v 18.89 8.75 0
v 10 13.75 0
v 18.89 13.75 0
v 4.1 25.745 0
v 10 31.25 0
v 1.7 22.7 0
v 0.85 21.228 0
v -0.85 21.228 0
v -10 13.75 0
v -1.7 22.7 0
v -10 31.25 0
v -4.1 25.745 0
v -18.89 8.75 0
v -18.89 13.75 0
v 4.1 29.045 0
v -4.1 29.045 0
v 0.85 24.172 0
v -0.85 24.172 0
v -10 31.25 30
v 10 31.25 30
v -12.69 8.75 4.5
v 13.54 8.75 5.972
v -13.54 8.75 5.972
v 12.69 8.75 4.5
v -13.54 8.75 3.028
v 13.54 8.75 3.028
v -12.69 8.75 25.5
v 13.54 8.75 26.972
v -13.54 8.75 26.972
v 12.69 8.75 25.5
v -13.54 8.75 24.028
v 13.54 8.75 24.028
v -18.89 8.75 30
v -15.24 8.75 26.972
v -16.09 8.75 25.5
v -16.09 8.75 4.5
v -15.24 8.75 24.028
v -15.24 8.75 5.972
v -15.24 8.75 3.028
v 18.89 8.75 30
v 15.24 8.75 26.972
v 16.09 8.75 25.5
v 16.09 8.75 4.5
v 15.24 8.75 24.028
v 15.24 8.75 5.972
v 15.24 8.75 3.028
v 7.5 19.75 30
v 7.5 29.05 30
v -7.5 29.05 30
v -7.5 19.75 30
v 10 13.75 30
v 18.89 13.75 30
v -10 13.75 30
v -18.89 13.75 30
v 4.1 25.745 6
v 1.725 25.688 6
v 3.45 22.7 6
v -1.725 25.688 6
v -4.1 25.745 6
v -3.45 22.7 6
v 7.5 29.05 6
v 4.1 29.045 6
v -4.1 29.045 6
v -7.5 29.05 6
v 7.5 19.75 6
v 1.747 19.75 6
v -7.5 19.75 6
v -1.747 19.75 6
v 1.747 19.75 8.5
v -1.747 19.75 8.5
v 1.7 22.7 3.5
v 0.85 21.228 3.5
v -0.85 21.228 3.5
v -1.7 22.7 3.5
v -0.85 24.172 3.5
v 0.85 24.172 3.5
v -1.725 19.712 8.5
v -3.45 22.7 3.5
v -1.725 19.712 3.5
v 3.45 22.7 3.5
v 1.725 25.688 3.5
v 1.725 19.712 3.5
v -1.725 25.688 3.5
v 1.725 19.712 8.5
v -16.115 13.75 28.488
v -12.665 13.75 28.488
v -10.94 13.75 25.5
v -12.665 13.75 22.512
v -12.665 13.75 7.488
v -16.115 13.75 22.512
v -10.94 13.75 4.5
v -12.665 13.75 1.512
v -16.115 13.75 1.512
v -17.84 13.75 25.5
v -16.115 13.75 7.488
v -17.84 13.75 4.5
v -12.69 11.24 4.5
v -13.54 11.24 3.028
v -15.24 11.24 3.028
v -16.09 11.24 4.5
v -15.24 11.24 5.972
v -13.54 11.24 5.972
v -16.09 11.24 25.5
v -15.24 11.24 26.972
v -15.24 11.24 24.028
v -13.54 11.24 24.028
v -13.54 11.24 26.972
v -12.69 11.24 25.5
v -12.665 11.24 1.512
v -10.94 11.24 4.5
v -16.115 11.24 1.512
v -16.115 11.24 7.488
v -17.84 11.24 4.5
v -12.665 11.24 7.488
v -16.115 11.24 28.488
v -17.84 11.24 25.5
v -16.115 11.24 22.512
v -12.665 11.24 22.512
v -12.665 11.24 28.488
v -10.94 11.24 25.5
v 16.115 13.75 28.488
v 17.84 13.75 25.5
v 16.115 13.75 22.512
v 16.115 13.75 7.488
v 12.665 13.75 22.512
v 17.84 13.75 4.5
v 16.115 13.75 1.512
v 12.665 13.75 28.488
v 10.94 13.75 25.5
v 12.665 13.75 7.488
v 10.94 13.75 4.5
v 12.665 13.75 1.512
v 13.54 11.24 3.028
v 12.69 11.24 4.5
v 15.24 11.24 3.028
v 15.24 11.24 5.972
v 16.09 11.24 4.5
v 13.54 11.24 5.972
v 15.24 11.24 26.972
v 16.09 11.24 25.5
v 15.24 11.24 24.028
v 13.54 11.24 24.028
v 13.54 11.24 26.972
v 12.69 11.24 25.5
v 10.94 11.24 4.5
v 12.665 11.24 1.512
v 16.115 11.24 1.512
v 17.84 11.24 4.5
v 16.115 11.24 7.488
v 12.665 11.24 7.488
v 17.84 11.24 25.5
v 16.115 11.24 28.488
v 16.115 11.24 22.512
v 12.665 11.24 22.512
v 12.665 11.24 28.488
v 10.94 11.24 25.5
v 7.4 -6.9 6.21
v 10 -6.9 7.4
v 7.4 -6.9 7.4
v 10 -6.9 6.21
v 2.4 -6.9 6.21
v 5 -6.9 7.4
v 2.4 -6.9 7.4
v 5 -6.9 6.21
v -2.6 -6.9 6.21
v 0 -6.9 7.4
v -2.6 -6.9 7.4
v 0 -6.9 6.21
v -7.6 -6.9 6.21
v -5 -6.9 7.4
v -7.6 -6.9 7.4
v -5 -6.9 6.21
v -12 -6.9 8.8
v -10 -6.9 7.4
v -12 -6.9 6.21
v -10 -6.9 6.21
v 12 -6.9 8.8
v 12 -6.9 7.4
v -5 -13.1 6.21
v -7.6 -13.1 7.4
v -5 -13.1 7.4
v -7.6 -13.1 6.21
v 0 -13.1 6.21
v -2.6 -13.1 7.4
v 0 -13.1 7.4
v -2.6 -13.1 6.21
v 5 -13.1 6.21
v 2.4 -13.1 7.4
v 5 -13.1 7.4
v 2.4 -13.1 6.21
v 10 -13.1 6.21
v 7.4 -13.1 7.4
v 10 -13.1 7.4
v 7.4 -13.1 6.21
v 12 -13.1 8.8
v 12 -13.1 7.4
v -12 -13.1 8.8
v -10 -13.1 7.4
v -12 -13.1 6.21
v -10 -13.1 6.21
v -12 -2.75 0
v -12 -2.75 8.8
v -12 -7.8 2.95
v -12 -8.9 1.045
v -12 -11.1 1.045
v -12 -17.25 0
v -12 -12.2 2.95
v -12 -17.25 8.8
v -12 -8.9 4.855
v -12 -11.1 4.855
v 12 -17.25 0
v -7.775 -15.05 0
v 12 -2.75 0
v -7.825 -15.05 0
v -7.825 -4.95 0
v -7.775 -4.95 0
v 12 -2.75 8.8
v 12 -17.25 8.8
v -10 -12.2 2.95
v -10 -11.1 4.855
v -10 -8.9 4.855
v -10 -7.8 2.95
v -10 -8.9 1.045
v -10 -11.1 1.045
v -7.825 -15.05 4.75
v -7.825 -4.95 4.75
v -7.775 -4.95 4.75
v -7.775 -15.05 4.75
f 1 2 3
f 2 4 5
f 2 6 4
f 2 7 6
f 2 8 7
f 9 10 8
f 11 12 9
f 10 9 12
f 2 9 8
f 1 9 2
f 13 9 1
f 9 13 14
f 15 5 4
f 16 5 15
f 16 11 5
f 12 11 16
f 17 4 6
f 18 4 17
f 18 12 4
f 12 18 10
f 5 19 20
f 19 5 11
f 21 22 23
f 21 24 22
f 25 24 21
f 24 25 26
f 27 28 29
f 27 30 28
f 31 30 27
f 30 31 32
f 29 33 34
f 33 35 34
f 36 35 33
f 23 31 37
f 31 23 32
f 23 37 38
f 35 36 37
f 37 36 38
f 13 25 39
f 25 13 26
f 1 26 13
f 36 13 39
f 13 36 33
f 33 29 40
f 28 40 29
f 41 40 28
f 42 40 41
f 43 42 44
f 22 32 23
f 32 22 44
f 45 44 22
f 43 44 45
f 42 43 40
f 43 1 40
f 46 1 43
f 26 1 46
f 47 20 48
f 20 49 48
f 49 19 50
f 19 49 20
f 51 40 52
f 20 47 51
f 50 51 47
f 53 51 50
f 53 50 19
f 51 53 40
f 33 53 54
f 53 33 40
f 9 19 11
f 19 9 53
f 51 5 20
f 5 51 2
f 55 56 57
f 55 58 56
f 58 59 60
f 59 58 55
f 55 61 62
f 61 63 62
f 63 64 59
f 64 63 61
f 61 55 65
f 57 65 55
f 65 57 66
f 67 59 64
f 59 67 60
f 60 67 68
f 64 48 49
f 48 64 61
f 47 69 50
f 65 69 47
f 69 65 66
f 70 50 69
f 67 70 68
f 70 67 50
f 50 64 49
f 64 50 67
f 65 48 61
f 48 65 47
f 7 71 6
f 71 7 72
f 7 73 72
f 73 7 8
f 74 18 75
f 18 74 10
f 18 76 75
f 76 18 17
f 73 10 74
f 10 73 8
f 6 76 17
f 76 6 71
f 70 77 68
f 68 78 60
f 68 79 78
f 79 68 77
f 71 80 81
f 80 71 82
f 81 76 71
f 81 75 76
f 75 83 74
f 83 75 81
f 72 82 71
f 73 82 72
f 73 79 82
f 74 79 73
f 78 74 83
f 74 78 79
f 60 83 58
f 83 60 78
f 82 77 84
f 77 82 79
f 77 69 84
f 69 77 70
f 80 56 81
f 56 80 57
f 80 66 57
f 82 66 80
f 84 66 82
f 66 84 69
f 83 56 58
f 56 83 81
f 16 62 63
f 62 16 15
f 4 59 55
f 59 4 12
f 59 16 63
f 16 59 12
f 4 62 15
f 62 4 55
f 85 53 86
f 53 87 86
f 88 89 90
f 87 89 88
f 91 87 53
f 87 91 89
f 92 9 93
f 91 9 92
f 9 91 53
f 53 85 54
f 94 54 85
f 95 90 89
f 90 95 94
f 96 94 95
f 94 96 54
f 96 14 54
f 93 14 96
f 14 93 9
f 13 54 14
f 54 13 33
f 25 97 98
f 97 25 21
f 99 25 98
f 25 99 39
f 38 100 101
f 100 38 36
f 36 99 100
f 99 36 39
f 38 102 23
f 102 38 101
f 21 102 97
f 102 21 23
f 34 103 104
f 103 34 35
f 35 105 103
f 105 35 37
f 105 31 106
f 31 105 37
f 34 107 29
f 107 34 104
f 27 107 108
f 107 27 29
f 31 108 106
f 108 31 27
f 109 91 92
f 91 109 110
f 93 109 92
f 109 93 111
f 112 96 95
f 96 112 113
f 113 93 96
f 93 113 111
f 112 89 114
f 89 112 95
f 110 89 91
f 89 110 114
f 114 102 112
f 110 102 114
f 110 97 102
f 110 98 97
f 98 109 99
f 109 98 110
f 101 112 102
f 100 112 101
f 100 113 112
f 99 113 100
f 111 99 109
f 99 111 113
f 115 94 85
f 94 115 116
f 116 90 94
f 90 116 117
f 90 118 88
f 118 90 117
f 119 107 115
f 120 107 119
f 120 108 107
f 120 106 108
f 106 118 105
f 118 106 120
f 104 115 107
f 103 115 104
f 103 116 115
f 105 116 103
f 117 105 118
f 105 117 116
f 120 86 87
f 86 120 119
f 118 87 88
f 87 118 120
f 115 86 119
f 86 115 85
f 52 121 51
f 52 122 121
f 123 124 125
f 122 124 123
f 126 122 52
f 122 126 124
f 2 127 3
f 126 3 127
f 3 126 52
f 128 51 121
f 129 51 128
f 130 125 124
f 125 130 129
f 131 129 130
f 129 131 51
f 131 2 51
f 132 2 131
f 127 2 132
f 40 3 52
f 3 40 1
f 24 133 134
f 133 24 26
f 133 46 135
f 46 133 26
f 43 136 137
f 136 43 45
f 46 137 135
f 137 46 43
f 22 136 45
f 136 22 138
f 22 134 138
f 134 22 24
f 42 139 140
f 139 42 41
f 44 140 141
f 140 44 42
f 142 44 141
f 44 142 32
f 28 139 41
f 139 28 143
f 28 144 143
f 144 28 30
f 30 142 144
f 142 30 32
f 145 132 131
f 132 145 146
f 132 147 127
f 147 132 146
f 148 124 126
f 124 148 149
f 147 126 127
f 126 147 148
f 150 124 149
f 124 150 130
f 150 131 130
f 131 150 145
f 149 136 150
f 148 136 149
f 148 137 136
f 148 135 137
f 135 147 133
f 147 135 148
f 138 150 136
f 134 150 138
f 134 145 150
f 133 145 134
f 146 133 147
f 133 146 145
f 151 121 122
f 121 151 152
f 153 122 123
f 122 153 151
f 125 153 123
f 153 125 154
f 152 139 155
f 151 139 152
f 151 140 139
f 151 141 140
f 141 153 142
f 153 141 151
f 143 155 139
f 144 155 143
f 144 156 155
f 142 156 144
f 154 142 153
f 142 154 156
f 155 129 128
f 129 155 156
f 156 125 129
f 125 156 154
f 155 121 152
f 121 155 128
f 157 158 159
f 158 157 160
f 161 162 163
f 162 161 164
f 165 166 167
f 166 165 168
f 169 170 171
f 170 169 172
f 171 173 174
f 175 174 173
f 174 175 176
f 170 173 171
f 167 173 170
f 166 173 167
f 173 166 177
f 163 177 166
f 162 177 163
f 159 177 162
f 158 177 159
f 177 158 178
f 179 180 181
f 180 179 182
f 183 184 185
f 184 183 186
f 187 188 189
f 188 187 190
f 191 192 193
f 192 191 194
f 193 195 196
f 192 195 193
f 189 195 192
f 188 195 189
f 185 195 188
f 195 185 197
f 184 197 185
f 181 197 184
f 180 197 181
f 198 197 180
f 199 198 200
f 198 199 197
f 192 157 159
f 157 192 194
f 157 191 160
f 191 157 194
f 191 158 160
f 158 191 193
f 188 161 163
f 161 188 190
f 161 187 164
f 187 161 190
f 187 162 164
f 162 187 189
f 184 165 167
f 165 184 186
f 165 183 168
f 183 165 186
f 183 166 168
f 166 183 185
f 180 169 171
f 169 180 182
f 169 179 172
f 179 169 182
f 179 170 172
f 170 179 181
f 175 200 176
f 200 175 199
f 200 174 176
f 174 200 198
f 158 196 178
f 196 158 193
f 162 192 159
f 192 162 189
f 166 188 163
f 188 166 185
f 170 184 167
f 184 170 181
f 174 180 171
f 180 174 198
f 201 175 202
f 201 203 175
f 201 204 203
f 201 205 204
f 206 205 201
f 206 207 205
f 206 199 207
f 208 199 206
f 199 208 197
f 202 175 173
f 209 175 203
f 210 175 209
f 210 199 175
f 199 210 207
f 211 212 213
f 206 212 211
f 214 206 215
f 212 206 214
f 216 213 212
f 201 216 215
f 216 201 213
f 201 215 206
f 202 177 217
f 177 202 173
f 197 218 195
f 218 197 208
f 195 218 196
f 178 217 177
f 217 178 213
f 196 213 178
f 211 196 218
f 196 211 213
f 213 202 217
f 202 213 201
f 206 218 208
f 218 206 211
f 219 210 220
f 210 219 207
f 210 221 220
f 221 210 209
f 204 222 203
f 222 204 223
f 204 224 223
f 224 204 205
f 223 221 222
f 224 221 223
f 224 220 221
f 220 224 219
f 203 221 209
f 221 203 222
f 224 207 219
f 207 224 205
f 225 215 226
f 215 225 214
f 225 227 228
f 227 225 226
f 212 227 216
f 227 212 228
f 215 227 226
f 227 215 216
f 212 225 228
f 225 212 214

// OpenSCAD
// Y-belt retainer/tensioner
// May 2012 John Newman

// This parameter deterimes how far the belt is held above the deck
/*rise*/
dRise = 10;			// Added to the depth to make the belt run horizontal
belt=1; // [0:T2.5,1:T5]

	
// Belt dimensions - These are for T2.5, see below for T5
tBase = (belt==1) ? 1.5 : 1.25;		// Thickness of belt base
tFull = (belt==1) ? 2.7:2;			// Thickness of Belt at teeth
wTooth = (belt==1) ? 2.6:1.4;		// Width of tooth (not actual, req)
wSpace = (belt==1) ? 2.4:1.1;		// Width of space
wBelt = (belt==1) ? 6.2:6.2;		// Width of belt

// Misc params
wHex = 6.9;		// Width of trap for hex nut
dHex	= 2.5;			// Depth of trap for hex nut
rM3 = 1.7;			// Radius of M3 bolt hole
sDrop = wHex/2-0.5; //2.8;		// Driver screw drop from base of slider
Adjust = 0.5;		// Spacing for things to fit inside other things!
pWidth = 9;			// Screw platform width
pHeight = 5;		// Screw platform height

// Base parameters
bwExt = 20;		// Widest part of base
bwInt = 15;			// inside width, where slider goes
blExt = 30;			// Overall length of base
blHed = 6;			// Head of base whch takes the strain !
bdExt = 12.5;		// This included a minimum floor thickness of 2mm (?)
bRoof = 2.2;		// The thickness of the roof which holds the slider in
bFloor = 1;			// The thickness of the floor under the slider (minimum)
bdSoc = bdExt-(bRoof+bFloor);		// 'Socket' depth for slider to go in

// Slider parameters
swMax = bwInt - Adjust;	// Wide part of slider
sdMax = bdSoc-Adjust;		// Height of slider

lBelt = blExt*2;		// Length of a bit of belt!
rMsk = blExt/3 ;		// Radius of part of mount masking...


// Print the parts as req.
translate([0,15+dRise,blExt/2]) rotate([0,90,90]) basepart();
translate([0,-10,(sdMax)/2]) rotate([0,180,0]) sliderpart();


module sliderpart() {
	difference() {
		cube([blExt-blHed,swMax,sdMax],center=true);
		// Make a hole for the bolt end
		translate([(blExt-blHed)/2-2,0,(sdMax/2)-sDrop]) rotate([30,0,0]) rotate([0,90,0]) cylinder(10,rM3+0.5,rM3+0.5,$fn=6);
		// Make a fracture to cause fill
		translate([(blExt-blHed)/2-4.2,0,(sdMax-tFull)/2+1]) cube([0.05,swMax-4.4,sdMax],center=true) ;
		// Finally indent for belt
		translate([-lBelt/2,-wBelt/2,-sdMax/2-0.1]) belt();
	}
}

// Note this is positioned so that the slider is centered on the XY plane
module basepart() {
	union() {
		difference() {
			translate([0,0,-dRise/2]) cube([blExt,bwExt,bdExt+dRise],center=true);
			// Remove the space for the slider
			translate([-blHed,0,(bFloor-bRoof)/2]) cube([blExt,bwInt,bdSoc],center=true);
			// Remove a hole for the bolt
			translate([(blExt/2-9),0,bFloor+sDrop-bdExt/2]) rotate([30,0,0]) rotate([0,90,0]) cylinder(15,rM3,rM3);
			// An indentation for the bolt head
			translate([(blExt/2)-(blHed+5-dHex),0,bFloor+sDrop-bdExt/2]) rotate([30,0,0]) rotate([0,90,0]) cylinder(5,wHex/2,wHex/2,$fn=6);
			// A slot for the belt to come through
			translate([blExt/2-blHed,0,(bdExt-tFull-0.61)/2-bRoof]) cube([15,wBelt+2,tFull+0.6],center=true);
		}
		for (m=[[0,0,0],[0,1,0]]) mirror(m) translate([0,bwExt/2-.1 + (pWidth/2-0.01),-dRise-bdExt/2+pHeight/2]) screwmount() ;
	}
}

module belt() {
	cube([lBelt,wBelt,tBase]) ;
	for (inc = [0:(wTooth+wSpace):lBelt-wTooth]) translate([inc,0,tBase-0.01]) cube([wTooth,wBelt,(tFull-tBase)]) ;
}

module screwmount() {
	difference() {
		cube([blExt,pWidth,pHeight],center=true);
		// Bolt holes
		translate([(blExt-pWidth)/2,0,-(pHeight/2+1)]) rotate([0,0,30]) cylinder(pHeight+2,rM3,rM3,$fn=6);
		translate([-(blExt-pWidth)/2,0,-(pHeight/2+1)]) rotate([0,0,30]) cylinder(pHeight+2,rM3,rM3,$fn=6);
		// Nut traps
		translate([(blExt-pWidth)/2,0,pHeight/2-dHex-0.01]) rotate([0,0,30]) cylinder(5,wHex/2,wHex/2,$fn=6);
		translate([-(blExt-pWidth)/2,0,pHeight/2-dHex-0.01]) rotate([0,0,30]) cylinder(5,wHex/2,wHex/2,$fn=6);
	}
}
